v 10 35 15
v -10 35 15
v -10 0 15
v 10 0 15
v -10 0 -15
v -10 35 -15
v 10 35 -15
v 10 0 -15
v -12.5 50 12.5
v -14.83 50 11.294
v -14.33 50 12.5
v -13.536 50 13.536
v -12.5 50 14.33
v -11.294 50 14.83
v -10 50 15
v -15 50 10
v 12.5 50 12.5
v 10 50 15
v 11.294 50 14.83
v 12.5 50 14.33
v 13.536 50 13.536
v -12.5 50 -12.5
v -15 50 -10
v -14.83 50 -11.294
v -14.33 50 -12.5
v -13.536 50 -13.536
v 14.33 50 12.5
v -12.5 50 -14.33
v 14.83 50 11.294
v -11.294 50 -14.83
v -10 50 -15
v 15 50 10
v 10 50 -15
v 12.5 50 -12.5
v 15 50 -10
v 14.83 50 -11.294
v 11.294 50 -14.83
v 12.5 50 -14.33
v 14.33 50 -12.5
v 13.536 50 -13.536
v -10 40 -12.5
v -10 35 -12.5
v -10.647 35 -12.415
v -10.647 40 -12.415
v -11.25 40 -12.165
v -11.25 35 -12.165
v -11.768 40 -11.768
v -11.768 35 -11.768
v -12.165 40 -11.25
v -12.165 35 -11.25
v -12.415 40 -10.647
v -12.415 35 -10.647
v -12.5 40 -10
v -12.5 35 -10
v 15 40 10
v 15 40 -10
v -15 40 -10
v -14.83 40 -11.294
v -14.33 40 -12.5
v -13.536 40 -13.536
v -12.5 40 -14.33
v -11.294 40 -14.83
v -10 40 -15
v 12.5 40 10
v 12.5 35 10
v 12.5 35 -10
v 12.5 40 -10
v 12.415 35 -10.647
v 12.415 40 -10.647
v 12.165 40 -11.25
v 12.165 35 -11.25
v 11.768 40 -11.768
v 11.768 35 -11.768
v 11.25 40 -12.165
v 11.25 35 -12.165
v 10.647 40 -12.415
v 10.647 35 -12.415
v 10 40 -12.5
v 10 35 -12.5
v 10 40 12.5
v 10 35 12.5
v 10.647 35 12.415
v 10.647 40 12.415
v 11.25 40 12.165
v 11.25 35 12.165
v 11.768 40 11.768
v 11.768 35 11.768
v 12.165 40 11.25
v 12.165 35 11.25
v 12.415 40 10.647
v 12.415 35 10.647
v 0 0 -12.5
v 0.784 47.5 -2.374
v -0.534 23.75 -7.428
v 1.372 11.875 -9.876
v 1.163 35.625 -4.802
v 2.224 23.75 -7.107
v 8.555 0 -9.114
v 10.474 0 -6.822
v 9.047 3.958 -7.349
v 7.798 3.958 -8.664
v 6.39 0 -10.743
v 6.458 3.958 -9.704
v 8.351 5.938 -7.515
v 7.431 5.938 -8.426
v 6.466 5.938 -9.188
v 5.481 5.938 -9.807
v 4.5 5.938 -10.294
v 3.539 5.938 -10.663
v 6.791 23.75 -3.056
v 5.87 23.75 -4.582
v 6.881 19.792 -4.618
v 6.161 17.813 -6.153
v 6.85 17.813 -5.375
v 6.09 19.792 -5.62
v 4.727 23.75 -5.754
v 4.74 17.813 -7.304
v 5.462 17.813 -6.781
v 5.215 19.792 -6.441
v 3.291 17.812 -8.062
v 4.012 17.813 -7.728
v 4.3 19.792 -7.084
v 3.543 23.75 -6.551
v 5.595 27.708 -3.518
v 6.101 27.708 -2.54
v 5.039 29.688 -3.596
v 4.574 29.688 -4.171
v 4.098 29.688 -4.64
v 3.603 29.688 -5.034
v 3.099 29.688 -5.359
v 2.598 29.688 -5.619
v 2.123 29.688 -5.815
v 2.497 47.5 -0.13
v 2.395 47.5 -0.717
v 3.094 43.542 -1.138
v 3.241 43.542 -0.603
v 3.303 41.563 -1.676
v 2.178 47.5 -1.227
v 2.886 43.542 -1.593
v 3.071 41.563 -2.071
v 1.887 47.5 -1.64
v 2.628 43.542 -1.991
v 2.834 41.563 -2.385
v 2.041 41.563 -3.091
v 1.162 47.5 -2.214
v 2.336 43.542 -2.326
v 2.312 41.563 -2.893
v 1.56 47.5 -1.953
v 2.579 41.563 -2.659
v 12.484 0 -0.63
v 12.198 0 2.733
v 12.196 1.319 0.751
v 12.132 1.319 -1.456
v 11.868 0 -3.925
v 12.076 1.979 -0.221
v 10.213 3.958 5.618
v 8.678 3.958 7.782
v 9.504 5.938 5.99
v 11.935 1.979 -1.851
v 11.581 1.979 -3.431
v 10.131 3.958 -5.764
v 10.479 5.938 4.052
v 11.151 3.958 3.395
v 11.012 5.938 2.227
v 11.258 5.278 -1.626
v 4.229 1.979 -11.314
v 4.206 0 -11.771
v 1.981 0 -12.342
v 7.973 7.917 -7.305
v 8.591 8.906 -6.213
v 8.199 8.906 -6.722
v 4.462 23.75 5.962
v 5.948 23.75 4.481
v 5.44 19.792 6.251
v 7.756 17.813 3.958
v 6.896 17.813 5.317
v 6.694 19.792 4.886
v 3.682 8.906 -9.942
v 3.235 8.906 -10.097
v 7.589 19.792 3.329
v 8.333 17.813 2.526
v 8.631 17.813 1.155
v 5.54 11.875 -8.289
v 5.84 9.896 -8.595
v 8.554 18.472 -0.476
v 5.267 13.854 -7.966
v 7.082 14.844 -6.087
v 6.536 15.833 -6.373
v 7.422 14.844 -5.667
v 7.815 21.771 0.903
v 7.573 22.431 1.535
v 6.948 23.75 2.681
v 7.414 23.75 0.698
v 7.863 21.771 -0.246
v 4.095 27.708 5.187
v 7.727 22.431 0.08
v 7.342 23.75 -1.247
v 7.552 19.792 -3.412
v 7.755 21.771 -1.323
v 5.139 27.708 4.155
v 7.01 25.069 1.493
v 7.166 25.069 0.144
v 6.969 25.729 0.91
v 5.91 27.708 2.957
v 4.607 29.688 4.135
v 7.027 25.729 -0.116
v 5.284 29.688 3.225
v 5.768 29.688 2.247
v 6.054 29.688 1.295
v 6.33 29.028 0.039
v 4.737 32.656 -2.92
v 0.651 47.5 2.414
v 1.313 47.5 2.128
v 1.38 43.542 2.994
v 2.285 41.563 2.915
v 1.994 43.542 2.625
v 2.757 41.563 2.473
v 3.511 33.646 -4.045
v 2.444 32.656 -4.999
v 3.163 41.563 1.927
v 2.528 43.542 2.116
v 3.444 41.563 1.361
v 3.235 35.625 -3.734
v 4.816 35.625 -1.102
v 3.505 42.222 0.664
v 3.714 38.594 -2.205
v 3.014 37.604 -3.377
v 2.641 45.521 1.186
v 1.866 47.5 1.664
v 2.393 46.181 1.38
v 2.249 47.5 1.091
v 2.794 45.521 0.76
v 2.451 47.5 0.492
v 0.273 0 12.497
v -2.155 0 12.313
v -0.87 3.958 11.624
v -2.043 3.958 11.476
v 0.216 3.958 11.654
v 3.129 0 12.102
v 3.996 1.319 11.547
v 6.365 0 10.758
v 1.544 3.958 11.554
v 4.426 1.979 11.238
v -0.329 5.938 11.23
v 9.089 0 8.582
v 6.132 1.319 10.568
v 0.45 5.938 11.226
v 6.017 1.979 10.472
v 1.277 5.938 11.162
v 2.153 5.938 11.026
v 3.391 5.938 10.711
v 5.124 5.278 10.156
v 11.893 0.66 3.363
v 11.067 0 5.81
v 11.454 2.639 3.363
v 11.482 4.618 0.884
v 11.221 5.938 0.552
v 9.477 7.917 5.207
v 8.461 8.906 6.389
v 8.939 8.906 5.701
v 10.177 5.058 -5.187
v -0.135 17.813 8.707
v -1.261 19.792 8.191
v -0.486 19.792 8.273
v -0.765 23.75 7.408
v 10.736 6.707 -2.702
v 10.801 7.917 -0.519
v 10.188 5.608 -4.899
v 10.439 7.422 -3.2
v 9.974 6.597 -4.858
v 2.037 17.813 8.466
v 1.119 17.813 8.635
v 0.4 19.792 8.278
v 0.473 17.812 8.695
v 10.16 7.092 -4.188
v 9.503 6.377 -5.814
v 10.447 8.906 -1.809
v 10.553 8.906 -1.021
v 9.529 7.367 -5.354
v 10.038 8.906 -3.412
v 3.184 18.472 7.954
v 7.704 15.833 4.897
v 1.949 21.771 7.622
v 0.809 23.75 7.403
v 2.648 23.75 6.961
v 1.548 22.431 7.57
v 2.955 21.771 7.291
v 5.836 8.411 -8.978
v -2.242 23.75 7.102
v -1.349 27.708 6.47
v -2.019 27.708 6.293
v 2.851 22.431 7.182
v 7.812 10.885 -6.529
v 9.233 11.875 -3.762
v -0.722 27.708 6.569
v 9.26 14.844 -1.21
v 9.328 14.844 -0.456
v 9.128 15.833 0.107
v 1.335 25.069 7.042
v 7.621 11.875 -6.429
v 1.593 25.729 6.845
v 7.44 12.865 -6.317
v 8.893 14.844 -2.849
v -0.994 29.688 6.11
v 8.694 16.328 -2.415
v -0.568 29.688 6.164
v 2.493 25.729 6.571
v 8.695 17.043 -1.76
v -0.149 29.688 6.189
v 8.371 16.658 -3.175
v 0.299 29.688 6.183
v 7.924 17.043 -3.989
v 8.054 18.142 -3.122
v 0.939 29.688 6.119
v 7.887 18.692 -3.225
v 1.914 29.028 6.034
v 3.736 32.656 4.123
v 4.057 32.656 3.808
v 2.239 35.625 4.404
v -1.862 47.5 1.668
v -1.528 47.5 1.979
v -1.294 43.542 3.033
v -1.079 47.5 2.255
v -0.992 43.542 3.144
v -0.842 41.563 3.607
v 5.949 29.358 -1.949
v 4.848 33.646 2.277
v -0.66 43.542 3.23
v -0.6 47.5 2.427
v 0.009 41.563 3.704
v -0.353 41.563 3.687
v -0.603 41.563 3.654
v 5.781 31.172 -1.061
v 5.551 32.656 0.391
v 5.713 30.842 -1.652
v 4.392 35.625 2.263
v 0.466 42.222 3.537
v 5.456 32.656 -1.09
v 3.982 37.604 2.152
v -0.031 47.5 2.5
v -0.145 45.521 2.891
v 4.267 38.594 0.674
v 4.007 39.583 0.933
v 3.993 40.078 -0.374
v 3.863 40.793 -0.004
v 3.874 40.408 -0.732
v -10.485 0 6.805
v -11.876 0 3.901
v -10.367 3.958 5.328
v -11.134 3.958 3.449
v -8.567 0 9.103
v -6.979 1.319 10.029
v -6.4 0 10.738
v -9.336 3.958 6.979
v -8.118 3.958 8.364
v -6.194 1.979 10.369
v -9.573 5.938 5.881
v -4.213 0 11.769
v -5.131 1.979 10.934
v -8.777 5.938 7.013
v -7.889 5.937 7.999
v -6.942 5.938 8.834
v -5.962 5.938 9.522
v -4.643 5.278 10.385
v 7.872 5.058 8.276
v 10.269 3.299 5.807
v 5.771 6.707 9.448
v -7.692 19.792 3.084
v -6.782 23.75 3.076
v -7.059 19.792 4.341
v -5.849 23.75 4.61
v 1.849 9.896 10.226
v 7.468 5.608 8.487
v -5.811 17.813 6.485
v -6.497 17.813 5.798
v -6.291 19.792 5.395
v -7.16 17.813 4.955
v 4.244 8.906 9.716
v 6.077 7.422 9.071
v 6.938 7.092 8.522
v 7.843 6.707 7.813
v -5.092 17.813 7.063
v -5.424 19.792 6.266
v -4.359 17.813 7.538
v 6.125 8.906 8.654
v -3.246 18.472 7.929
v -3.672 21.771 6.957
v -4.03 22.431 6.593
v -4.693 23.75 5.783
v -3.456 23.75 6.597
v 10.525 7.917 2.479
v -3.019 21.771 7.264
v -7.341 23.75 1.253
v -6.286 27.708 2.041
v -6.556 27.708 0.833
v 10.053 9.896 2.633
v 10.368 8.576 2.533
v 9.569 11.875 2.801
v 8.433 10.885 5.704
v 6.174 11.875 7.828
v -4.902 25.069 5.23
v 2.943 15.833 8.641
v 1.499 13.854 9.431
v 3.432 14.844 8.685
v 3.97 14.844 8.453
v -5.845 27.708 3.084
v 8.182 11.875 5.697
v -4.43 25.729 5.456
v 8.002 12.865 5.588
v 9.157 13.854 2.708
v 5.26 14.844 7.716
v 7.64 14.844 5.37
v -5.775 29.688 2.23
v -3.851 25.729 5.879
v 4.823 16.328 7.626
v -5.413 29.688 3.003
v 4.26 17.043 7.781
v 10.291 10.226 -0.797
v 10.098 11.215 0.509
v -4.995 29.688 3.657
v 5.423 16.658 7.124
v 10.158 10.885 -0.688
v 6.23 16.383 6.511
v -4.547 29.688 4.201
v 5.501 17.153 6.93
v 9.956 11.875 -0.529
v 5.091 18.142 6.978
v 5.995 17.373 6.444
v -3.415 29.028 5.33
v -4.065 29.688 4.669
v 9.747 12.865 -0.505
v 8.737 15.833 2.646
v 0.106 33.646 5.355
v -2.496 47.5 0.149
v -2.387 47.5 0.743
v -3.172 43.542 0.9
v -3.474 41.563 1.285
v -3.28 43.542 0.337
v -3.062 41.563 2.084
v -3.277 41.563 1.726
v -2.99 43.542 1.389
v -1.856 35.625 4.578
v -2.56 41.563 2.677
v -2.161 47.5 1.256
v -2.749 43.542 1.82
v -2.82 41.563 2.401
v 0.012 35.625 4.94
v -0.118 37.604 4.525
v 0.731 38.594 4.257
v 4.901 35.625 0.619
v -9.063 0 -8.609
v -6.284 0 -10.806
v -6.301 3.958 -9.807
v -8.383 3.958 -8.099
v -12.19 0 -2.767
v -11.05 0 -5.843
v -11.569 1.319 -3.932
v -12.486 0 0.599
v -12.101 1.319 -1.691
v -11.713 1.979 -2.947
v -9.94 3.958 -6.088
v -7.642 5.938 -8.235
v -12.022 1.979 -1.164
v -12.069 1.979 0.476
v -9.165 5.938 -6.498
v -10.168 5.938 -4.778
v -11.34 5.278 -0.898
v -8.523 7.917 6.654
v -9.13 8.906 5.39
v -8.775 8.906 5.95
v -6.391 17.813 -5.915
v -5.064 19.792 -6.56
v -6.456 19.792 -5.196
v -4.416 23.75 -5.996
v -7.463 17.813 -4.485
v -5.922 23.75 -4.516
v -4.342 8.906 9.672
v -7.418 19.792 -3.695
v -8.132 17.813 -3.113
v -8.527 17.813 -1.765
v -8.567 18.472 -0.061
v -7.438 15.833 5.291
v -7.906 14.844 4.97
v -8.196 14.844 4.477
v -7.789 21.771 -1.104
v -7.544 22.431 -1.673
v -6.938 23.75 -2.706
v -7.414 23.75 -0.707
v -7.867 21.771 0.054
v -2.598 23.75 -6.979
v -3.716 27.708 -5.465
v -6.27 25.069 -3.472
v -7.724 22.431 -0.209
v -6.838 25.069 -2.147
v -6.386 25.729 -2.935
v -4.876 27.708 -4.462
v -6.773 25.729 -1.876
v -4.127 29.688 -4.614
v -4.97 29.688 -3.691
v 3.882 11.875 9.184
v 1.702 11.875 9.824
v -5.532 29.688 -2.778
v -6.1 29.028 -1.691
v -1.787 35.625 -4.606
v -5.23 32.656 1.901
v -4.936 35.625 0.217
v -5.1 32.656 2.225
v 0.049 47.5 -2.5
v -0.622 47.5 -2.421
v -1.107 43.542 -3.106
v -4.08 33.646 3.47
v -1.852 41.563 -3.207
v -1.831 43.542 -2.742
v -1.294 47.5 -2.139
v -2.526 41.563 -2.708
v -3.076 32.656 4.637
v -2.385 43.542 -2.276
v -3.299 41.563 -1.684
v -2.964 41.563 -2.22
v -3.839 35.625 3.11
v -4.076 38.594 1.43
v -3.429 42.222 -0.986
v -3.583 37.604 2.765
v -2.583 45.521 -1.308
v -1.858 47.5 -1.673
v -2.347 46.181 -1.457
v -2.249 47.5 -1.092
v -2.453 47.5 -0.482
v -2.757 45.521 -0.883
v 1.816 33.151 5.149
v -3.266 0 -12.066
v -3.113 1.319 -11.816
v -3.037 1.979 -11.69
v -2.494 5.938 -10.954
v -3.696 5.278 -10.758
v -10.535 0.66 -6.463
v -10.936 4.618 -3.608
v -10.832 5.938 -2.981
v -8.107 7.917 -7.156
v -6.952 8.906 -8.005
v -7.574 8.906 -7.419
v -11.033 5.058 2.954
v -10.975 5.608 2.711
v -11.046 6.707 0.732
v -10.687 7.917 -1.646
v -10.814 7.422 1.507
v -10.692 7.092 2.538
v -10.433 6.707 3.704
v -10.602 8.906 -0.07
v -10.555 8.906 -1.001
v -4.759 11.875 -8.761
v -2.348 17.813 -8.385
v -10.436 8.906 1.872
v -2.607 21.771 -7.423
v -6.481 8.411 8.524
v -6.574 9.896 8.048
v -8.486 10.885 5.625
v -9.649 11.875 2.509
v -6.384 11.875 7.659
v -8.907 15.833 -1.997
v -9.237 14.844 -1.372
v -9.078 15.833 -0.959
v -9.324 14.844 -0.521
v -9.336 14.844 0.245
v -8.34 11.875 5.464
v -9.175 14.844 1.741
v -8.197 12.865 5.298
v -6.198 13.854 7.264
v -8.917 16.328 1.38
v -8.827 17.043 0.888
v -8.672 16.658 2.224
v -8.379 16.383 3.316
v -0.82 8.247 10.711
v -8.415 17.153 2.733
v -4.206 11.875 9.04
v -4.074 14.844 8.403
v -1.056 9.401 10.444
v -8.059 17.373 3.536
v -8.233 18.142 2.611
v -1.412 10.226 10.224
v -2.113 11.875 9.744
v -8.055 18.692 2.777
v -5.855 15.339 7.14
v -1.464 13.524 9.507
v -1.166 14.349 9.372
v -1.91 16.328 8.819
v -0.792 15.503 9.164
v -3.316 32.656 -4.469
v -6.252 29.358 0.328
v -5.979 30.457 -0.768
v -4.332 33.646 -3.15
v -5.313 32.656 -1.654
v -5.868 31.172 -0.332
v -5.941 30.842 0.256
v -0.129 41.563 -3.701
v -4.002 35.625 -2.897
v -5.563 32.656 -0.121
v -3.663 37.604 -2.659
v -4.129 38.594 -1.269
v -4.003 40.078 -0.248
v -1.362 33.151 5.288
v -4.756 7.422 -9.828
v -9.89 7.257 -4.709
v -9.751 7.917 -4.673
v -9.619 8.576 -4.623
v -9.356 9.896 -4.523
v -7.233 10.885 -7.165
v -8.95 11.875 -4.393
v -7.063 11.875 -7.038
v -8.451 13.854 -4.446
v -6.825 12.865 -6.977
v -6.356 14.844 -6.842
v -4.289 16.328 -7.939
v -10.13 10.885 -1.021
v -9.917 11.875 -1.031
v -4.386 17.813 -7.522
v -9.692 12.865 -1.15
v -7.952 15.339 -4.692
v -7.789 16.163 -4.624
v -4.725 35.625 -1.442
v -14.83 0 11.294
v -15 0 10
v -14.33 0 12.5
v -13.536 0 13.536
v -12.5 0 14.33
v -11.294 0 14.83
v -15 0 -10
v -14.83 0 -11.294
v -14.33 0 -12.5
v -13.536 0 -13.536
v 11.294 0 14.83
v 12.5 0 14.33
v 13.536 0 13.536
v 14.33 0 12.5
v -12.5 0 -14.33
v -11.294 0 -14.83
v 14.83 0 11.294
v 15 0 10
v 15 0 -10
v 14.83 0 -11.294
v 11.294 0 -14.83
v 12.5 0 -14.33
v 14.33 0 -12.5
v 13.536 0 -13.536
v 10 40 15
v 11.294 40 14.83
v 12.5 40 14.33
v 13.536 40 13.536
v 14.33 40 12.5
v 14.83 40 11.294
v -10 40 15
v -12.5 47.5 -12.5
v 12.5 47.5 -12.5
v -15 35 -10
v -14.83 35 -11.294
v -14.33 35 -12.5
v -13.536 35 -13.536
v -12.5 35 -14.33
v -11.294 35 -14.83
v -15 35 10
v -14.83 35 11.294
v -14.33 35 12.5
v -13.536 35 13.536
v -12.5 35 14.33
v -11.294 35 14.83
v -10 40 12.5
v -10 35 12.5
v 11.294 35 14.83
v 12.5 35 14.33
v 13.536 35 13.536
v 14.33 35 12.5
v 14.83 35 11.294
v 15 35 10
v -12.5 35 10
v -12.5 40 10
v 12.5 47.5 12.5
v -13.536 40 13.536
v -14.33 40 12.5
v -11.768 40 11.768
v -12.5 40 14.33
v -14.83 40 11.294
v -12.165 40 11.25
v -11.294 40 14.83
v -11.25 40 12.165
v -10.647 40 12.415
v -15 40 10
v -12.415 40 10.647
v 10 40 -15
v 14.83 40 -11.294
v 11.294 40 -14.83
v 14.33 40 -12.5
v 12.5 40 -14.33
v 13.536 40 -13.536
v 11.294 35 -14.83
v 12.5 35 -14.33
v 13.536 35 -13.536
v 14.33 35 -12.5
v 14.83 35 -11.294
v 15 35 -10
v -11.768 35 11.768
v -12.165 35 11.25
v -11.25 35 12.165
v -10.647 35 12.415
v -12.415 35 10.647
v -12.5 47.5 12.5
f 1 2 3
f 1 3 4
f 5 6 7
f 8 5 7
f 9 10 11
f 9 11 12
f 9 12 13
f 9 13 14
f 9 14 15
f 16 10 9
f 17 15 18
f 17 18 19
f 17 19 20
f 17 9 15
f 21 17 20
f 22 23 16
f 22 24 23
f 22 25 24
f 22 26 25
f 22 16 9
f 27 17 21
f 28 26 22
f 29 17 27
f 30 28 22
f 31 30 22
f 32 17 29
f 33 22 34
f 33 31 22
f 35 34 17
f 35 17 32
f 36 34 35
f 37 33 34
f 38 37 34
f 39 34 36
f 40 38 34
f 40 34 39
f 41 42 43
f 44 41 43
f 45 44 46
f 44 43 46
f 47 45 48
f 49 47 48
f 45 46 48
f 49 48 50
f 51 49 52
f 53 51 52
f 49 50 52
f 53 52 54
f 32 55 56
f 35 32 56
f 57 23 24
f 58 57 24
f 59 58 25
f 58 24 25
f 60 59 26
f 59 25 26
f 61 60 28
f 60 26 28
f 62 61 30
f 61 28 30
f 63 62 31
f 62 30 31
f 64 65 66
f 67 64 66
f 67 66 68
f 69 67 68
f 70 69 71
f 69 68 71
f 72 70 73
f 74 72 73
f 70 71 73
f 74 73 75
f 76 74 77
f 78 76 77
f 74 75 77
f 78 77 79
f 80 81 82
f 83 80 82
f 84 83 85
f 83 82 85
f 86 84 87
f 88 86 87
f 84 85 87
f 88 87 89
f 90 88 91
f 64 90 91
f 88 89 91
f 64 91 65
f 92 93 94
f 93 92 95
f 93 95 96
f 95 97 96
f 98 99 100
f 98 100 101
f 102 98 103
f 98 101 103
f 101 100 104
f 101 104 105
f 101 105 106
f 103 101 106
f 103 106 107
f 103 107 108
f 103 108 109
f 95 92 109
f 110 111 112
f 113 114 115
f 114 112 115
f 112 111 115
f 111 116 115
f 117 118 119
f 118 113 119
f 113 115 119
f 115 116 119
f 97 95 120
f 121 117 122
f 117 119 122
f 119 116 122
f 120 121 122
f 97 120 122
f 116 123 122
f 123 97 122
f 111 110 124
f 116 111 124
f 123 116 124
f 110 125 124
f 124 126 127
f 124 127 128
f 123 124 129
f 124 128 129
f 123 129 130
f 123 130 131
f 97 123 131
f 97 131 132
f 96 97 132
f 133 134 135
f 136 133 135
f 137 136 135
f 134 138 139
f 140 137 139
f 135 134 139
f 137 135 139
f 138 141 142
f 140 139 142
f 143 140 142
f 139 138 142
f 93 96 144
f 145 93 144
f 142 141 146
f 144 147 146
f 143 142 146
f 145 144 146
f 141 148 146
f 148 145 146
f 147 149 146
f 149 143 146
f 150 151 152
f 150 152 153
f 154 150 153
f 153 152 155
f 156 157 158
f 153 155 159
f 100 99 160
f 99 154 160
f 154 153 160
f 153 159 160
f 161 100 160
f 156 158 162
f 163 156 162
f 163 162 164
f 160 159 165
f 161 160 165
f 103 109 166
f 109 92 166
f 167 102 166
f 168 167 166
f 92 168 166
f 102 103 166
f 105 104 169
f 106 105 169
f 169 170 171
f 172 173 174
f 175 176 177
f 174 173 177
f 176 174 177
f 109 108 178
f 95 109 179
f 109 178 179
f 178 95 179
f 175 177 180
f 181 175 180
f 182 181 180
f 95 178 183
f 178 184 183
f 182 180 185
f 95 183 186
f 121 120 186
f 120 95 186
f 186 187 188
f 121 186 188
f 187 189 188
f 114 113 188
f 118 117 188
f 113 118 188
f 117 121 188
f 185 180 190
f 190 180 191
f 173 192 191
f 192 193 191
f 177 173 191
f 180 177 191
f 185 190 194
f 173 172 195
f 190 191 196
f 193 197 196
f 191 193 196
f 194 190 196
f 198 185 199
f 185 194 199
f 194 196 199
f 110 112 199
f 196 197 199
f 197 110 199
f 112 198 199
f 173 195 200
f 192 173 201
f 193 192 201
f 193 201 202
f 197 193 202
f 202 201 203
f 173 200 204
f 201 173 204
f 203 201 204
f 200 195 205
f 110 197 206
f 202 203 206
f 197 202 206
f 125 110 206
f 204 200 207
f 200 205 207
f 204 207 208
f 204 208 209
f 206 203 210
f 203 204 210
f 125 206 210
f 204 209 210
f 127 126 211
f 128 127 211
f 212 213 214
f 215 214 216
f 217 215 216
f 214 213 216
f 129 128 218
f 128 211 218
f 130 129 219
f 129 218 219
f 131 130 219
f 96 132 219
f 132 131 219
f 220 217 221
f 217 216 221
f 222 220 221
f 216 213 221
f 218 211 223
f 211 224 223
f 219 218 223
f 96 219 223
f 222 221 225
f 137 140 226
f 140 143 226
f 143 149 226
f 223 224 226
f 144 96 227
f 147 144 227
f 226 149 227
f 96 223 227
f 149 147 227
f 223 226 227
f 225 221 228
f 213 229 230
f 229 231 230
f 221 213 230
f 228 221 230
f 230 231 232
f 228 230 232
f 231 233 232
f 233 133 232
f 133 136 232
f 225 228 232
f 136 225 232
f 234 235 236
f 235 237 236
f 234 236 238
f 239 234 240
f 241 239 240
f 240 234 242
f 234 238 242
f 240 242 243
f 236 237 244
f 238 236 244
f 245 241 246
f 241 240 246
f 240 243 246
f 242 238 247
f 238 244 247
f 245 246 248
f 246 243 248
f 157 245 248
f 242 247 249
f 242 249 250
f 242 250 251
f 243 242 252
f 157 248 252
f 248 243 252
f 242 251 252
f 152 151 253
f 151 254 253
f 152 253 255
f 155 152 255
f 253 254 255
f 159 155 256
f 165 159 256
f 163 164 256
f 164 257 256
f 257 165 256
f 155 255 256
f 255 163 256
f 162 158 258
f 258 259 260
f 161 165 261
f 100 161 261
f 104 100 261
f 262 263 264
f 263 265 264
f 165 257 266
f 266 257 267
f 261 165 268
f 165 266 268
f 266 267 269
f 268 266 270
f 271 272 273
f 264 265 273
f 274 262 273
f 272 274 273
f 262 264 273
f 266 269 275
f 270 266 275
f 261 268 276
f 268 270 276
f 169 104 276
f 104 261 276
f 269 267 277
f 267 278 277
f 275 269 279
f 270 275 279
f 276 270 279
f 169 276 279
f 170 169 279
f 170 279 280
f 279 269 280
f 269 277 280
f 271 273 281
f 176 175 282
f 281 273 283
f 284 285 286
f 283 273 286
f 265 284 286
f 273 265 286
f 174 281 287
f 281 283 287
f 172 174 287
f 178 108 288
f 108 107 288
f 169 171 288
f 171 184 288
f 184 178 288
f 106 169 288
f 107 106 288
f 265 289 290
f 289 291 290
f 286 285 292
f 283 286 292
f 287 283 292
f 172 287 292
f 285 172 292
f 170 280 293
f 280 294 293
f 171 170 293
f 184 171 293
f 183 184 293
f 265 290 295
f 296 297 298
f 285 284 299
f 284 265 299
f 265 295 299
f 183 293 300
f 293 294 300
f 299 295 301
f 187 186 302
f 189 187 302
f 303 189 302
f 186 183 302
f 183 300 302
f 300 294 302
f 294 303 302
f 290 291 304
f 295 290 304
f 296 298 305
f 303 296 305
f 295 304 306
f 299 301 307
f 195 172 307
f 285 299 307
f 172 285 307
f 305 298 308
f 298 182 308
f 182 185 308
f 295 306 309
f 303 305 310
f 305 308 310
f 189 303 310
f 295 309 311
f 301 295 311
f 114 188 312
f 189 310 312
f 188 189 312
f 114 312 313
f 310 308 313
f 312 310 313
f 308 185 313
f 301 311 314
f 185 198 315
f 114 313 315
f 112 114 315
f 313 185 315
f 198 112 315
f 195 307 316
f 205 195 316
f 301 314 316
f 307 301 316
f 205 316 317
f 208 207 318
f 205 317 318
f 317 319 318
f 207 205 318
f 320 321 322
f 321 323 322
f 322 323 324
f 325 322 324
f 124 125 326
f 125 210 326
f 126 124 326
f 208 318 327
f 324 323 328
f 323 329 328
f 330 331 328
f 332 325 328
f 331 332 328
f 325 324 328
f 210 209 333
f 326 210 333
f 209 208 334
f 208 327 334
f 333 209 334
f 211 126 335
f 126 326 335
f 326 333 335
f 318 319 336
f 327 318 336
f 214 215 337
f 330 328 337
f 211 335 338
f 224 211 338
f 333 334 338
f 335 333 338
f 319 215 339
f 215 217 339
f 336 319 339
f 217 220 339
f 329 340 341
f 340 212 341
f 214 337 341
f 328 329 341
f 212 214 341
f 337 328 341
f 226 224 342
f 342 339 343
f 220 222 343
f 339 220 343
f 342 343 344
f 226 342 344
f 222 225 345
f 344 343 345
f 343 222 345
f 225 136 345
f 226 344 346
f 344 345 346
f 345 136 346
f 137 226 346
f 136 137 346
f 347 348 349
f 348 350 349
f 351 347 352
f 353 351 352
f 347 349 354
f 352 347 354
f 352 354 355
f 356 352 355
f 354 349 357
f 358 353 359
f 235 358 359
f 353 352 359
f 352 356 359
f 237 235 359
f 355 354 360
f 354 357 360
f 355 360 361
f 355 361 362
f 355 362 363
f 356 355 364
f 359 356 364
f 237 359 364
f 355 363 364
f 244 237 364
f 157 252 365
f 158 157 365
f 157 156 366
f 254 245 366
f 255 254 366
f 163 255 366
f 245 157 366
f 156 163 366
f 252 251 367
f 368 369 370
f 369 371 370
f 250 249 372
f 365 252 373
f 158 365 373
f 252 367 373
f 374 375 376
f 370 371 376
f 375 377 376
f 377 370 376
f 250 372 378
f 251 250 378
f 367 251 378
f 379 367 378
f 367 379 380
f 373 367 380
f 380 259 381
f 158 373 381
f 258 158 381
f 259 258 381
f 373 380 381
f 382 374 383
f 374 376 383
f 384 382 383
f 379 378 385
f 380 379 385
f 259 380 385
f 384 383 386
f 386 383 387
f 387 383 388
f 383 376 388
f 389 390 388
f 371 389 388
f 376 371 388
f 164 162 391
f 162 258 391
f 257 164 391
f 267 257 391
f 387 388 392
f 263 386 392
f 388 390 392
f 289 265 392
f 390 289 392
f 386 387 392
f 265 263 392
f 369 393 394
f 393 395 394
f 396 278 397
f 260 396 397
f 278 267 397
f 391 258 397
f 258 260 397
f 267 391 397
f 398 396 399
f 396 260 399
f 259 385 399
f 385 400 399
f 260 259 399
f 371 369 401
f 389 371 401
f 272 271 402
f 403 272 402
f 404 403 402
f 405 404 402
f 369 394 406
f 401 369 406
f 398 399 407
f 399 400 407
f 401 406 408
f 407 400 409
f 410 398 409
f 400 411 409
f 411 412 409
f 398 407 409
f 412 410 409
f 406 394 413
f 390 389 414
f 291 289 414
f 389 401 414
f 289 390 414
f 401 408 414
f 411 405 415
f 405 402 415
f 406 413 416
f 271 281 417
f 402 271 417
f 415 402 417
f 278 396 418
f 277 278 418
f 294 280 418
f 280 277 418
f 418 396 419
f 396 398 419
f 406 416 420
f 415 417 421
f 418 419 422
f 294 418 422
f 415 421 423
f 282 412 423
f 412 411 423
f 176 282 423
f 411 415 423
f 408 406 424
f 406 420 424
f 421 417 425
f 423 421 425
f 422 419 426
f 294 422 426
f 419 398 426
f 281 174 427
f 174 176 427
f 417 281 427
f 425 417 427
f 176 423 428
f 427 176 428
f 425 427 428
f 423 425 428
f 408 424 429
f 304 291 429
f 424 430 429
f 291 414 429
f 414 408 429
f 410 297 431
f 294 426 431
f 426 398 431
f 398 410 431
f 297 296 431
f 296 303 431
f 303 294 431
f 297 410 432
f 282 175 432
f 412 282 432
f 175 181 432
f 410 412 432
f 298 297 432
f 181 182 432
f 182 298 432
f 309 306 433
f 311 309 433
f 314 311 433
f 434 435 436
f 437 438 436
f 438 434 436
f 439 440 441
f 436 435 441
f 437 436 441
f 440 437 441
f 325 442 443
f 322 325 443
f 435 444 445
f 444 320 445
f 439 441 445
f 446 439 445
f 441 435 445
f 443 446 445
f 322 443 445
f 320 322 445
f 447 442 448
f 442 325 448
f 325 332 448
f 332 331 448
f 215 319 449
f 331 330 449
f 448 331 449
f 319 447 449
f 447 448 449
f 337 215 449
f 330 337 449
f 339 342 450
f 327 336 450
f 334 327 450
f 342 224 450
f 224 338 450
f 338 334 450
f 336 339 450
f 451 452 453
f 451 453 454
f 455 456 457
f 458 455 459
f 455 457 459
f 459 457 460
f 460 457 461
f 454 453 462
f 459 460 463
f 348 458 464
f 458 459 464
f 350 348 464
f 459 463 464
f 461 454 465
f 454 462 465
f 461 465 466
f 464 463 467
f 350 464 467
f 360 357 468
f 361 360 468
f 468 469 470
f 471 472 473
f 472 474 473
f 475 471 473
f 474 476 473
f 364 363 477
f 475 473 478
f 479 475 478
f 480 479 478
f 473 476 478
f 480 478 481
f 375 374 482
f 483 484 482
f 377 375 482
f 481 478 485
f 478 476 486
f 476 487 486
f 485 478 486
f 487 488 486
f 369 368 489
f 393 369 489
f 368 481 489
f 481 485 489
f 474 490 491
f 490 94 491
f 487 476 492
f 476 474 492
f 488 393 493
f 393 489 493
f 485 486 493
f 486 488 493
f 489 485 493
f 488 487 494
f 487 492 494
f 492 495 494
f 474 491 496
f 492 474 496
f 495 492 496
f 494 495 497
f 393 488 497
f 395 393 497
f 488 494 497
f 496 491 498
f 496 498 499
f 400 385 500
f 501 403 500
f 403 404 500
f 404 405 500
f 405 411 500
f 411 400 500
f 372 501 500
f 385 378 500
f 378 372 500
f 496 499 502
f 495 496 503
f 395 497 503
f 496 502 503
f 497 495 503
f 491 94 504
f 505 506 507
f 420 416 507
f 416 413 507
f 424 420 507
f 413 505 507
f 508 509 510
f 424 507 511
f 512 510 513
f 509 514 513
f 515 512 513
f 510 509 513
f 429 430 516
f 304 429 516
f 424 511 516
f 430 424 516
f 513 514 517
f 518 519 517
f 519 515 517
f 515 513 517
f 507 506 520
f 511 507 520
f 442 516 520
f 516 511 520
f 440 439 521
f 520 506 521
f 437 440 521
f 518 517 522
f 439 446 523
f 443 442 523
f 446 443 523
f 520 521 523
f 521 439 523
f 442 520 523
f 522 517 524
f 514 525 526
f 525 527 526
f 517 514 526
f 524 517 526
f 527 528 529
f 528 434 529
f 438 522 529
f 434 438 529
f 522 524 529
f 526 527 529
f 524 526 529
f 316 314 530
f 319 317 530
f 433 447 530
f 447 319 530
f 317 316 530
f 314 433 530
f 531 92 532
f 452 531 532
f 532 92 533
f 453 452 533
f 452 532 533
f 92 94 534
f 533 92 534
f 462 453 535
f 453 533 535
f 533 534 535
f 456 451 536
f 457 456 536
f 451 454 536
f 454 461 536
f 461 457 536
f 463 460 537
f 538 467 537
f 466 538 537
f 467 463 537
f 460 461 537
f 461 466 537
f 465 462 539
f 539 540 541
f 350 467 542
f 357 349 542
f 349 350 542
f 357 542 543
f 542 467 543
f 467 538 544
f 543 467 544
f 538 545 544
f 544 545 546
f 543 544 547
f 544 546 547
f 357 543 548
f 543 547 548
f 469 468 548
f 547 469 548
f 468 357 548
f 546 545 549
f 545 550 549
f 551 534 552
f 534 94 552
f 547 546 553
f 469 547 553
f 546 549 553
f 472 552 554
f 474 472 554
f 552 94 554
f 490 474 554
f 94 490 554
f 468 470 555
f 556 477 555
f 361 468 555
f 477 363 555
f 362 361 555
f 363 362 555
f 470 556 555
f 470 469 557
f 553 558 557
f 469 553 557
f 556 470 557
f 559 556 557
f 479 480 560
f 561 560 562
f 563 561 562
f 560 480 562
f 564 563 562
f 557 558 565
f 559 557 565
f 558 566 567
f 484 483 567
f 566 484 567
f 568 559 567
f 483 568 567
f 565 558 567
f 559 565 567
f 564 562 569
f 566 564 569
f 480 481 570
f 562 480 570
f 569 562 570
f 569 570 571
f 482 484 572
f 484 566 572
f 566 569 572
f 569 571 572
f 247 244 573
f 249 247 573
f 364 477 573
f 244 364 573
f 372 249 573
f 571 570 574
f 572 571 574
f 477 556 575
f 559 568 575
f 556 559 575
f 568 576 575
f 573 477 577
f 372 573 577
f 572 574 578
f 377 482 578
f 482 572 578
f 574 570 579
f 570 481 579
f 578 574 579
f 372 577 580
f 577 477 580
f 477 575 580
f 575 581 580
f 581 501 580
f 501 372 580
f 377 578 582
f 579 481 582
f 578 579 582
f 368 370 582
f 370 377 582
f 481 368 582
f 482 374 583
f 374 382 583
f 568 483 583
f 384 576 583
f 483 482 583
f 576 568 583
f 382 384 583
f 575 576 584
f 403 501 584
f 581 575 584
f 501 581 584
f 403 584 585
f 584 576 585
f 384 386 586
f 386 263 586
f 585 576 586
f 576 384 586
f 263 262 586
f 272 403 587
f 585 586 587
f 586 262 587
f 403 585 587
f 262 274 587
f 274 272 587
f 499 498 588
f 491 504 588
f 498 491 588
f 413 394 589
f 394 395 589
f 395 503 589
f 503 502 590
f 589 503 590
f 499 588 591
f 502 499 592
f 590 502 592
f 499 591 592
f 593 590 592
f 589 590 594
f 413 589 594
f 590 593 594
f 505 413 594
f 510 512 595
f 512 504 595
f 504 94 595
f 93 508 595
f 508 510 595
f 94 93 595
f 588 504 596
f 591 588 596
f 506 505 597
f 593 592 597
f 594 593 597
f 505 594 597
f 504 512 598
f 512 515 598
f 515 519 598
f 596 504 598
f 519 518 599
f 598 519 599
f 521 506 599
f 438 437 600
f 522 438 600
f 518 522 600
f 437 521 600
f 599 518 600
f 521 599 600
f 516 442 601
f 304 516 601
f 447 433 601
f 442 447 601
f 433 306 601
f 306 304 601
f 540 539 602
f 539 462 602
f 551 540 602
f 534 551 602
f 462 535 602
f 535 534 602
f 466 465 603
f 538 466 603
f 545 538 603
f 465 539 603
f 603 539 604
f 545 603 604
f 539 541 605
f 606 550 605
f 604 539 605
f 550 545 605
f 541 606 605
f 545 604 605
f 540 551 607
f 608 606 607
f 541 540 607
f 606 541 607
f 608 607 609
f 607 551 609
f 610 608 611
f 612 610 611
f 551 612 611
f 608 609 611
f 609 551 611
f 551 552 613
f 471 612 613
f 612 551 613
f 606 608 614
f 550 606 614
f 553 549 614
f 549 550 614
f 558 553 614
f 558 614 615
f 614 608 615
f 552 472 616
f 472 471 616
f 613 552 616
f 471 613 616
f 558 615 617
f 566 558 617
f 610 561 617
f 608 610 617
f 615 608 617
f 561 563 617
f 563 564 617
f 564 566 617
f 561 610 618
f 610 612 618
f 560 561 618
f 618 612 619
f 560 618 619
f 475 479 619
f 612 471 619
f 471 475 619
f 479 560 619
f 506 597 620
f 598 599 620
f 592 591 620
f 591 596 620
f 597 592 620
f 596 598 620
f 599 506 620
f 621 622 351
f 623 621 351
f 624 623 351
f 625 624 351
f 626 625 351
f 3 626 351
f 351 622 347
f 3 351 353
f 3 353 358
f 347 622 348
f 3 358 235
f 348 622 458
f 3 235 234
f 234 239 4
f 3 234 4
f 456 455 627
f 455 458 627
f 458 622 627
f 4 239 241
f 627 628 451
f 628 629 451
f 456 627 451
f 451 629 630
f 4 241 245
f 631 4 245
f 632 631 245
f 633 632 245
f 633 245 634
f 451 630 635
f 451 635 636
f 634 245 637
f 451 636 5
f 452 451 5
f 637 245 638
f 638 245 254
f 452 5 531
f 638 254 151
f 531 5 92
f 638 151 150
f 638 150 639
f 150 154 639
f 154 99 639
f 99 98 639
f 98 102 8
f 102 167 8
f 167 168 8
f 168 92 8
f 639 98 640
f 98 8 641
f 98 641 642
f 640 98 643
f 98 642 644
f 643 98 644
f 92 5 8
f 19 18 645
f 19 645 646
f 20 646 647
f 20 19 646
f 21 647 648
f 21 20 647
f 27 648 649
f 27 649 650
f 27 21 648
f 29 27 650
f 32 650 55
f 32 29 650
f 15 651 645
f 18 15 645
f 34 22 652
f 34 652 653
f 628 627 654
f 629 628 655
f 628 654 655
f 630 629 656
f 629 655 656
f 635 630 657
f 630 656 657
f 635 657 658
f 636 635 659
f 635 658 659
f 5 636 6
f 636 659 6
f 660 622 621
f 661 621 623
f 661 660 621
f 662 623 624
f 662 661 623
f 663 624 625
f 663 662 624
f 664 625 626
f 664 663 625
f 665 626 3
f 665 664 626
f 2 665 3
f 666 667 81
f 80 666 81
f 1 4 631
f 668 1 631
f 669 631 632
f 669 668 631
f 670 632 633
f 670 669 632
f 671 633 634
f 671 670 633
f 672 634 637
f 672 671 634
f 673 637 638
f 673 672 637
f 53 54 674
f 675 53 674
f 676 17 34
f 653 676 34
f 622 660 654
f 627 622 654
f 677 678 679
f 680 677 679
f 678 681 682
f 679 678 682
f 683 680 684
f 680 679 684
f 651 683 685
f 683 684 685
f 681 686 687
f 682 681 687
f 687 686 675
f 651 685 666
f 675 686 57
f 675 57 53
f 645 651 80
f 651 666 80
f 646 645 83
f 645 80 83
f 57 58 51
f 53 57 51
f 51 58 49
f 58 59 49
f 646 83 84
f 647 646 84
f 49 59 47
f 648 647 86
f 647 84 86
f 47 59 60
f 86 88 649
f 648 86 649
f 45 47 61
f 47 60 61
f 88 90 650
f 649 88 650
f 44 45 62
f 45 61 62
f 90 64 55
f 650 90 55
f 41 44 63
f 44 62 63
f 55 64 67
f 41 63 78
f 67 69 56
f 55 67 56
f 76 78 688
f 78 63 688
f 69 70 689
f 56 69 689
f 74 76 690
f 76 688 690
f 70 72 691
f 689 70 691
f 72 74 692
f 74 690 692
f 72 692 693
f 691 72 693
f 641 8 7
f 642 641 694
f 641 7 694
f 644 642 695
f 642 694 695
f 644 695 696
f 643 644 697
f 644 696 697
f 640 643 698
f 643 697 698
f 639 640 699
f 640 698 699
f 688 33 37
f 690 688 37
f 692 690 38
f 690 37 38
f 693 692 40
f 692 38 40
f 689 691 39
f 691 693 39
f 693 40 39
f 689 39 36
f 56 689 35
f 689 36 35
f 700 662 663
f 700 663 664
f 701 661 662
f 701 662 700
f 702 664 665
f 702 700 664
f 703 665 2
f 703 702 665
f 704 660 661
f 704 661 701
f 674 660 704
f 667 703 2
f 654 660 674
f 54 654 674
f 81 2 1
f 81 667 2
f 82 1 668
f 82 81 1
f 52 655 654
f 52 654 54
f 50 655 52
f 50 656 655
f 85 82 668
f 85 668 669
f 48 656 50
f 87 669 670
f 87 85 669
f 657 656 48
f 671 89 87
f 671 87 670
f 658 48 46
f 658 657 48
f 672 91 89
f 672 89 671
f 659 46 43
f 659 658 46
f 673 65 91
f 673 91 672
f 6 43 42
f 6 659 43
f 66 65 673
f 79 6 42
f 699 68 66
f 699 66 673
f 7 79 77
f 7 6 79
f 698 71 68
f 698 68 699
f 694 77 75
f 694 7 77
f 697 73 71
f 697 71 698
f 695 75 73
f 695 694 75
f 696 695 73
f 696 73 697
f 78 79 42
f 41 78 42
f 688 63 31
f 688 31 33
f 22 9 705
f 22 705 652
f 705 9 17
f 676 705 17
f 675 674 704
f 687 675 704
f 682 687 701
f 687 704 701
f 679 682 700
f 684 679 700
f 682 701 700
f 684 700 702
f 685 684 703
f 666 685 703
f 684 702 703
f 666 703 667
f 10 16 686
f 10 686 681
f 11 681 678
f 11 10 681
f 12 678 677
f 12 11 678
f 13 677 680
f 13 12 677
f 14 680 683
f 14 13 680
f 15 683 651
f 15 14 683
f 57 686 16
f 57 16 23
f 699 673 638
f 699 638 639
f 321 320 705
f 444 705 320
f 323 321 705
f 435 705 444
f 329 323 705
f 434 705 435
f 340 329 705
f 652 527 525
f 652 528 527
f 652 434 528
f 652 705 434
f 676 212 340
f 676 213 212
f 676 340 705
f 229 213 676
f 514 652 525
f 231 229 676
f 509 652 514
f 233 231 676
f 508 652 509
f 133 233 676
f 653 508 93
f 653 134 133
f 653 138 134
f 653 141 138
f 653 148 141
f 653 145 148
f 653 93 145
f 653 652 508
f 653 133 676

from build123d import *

# Parameters (mm, degrees)
SKETCH2_W           = 30
SKETCH2_H           = 30
BOSS_EXTRUDE1_DEPTH = 50
SKETCH3_W           = 25
SKETCH3_H           = 25
CUT_EXTRUDE1_DEPTH  = 2.5
FILLET1_R           = 5
SKETCH9_R           = 19.95304153
CUT_EXTRUDE2_DEPTH  = 5


with BuildPart() as part:
    # Sketch2 → Boss-Extrude1 (new body)
    with BuildSketch(Plane(origin=(0, 0, 0), x_dir=(1, 0, 0), z_dir=(0, 1, 0))):
        Rectangle(SKETCH2_W, SKETCH2_H)
    extrude(amount=BOSS_EXTRUDE1_DEPTH)

    # Sketch3 → Cut-Extrude1 (cut)
    with BuildSketch(Plane(origin=(0, 50, 0), x_dir=(1, 0, 0), z_dir=(0, 1, 0))):
        Rectangle(SKETCH3_W, SKETCH3_H)
    extrude(amount=-CUT_EXTRUDE1_DEPTH, mode=Mode.SUBTRACT)

    # Fillet1
    fillet1_edges = [part.edges().sort_by_distance(p)[0] for p in [
        (15, 25, 15),
        (-15, 25, 15),
        (-15, 25, -15),
        (15, 25, -15),
    ]]
    fillet(fillet1_edges, radius=FILLET1_R)

    # Cut-Loft2: read off the stored shape, not the designer's step
    # Cut-Loft2: loft between two sections, ruled curve by curve
    cut_loft2_from = [
        Edge.make_bspline([(0, 0, -12.5), (-25, 0, -12.5), (-25, 0, 12.5), (0, 0, 12.5), (25, 0, 12.5), (25, 0, -12.5), (0, 0, -12.5)], [0, 0, 0, 0, 0.5, 0.5, 0.5, 1, 1, 1, 1], 3, [1, 0.333333333, 0.333333333, 1, 0.333333333, 0.333333333, 1]),
    ]
    cut_loft2_to = [
        Edge.make_bspline([(0.784484005, 47.5, -2.373728048), (-3.962972092, 47.5, -3.942696057), (-5.531940101, 47.5, 0.804760039), (-0.784484005, 47.5, 2.373728048), (3.962972092, 47.5, 3.942696057), (5.531940101, 47.5, -0.804760039), (0.784484005, 47.5, -2.373728048)], [0, 0, 0, 0, 0.5, 0.5, 0.5, 1, 1, 1, 1], 3, [1, 0.333333333, 0.333333333, 1, 0.333333333, 0.333333333, 1]),
    ]
    cut_loft2 = Solid(Shell([*[Face.make_surface_from_curves(cut_loft2_from[k], cut_loft2_to[k]) for k in range(1)], Face(Wire(cut_loft2_from)), Face(Wire(cut_loft2_to))]))
    add(cut_loft2, mode=Mode.SUBTRACT)

    # Sketch9 → Cut-Extrude2 (cut)
    with BuildSketch(Plane(origin=(0, 35, 0), x_dir=(1, 0, 0), z_dir=(0, 1, 0))):
        Circle(SKETCH9_R)
        with BuildLine():
            Line((12.5, -10), (12.5, 10))
            ThreePointArc((12.5, 10), (11.767766953, 11.767766953), (10, 12.5))
            Line((10, 12.5), (-10, 12.5))
            ThreePointArc((-10, 12.5), (-11.767766953, 11.767766953), (-12.5, 10))
            Line((-12.5, 10), (-12.5, -10))
            ThreePointArc((-12.5, -10), (-11.767766953, -11.767766953), (-10, -12.5))
            Line((-10, -12.5), (10, -12.5))
            ThreePointArc((10, -12.5), (11.767766953, -11.767766953), (12.5, -10))
        make_face(mode=Mode.SUBTRACT)
    extrude(amount=CUT_EXTRUDE2_DEPTH, mode=Mode.SUBTRACT)


solid = part.part
